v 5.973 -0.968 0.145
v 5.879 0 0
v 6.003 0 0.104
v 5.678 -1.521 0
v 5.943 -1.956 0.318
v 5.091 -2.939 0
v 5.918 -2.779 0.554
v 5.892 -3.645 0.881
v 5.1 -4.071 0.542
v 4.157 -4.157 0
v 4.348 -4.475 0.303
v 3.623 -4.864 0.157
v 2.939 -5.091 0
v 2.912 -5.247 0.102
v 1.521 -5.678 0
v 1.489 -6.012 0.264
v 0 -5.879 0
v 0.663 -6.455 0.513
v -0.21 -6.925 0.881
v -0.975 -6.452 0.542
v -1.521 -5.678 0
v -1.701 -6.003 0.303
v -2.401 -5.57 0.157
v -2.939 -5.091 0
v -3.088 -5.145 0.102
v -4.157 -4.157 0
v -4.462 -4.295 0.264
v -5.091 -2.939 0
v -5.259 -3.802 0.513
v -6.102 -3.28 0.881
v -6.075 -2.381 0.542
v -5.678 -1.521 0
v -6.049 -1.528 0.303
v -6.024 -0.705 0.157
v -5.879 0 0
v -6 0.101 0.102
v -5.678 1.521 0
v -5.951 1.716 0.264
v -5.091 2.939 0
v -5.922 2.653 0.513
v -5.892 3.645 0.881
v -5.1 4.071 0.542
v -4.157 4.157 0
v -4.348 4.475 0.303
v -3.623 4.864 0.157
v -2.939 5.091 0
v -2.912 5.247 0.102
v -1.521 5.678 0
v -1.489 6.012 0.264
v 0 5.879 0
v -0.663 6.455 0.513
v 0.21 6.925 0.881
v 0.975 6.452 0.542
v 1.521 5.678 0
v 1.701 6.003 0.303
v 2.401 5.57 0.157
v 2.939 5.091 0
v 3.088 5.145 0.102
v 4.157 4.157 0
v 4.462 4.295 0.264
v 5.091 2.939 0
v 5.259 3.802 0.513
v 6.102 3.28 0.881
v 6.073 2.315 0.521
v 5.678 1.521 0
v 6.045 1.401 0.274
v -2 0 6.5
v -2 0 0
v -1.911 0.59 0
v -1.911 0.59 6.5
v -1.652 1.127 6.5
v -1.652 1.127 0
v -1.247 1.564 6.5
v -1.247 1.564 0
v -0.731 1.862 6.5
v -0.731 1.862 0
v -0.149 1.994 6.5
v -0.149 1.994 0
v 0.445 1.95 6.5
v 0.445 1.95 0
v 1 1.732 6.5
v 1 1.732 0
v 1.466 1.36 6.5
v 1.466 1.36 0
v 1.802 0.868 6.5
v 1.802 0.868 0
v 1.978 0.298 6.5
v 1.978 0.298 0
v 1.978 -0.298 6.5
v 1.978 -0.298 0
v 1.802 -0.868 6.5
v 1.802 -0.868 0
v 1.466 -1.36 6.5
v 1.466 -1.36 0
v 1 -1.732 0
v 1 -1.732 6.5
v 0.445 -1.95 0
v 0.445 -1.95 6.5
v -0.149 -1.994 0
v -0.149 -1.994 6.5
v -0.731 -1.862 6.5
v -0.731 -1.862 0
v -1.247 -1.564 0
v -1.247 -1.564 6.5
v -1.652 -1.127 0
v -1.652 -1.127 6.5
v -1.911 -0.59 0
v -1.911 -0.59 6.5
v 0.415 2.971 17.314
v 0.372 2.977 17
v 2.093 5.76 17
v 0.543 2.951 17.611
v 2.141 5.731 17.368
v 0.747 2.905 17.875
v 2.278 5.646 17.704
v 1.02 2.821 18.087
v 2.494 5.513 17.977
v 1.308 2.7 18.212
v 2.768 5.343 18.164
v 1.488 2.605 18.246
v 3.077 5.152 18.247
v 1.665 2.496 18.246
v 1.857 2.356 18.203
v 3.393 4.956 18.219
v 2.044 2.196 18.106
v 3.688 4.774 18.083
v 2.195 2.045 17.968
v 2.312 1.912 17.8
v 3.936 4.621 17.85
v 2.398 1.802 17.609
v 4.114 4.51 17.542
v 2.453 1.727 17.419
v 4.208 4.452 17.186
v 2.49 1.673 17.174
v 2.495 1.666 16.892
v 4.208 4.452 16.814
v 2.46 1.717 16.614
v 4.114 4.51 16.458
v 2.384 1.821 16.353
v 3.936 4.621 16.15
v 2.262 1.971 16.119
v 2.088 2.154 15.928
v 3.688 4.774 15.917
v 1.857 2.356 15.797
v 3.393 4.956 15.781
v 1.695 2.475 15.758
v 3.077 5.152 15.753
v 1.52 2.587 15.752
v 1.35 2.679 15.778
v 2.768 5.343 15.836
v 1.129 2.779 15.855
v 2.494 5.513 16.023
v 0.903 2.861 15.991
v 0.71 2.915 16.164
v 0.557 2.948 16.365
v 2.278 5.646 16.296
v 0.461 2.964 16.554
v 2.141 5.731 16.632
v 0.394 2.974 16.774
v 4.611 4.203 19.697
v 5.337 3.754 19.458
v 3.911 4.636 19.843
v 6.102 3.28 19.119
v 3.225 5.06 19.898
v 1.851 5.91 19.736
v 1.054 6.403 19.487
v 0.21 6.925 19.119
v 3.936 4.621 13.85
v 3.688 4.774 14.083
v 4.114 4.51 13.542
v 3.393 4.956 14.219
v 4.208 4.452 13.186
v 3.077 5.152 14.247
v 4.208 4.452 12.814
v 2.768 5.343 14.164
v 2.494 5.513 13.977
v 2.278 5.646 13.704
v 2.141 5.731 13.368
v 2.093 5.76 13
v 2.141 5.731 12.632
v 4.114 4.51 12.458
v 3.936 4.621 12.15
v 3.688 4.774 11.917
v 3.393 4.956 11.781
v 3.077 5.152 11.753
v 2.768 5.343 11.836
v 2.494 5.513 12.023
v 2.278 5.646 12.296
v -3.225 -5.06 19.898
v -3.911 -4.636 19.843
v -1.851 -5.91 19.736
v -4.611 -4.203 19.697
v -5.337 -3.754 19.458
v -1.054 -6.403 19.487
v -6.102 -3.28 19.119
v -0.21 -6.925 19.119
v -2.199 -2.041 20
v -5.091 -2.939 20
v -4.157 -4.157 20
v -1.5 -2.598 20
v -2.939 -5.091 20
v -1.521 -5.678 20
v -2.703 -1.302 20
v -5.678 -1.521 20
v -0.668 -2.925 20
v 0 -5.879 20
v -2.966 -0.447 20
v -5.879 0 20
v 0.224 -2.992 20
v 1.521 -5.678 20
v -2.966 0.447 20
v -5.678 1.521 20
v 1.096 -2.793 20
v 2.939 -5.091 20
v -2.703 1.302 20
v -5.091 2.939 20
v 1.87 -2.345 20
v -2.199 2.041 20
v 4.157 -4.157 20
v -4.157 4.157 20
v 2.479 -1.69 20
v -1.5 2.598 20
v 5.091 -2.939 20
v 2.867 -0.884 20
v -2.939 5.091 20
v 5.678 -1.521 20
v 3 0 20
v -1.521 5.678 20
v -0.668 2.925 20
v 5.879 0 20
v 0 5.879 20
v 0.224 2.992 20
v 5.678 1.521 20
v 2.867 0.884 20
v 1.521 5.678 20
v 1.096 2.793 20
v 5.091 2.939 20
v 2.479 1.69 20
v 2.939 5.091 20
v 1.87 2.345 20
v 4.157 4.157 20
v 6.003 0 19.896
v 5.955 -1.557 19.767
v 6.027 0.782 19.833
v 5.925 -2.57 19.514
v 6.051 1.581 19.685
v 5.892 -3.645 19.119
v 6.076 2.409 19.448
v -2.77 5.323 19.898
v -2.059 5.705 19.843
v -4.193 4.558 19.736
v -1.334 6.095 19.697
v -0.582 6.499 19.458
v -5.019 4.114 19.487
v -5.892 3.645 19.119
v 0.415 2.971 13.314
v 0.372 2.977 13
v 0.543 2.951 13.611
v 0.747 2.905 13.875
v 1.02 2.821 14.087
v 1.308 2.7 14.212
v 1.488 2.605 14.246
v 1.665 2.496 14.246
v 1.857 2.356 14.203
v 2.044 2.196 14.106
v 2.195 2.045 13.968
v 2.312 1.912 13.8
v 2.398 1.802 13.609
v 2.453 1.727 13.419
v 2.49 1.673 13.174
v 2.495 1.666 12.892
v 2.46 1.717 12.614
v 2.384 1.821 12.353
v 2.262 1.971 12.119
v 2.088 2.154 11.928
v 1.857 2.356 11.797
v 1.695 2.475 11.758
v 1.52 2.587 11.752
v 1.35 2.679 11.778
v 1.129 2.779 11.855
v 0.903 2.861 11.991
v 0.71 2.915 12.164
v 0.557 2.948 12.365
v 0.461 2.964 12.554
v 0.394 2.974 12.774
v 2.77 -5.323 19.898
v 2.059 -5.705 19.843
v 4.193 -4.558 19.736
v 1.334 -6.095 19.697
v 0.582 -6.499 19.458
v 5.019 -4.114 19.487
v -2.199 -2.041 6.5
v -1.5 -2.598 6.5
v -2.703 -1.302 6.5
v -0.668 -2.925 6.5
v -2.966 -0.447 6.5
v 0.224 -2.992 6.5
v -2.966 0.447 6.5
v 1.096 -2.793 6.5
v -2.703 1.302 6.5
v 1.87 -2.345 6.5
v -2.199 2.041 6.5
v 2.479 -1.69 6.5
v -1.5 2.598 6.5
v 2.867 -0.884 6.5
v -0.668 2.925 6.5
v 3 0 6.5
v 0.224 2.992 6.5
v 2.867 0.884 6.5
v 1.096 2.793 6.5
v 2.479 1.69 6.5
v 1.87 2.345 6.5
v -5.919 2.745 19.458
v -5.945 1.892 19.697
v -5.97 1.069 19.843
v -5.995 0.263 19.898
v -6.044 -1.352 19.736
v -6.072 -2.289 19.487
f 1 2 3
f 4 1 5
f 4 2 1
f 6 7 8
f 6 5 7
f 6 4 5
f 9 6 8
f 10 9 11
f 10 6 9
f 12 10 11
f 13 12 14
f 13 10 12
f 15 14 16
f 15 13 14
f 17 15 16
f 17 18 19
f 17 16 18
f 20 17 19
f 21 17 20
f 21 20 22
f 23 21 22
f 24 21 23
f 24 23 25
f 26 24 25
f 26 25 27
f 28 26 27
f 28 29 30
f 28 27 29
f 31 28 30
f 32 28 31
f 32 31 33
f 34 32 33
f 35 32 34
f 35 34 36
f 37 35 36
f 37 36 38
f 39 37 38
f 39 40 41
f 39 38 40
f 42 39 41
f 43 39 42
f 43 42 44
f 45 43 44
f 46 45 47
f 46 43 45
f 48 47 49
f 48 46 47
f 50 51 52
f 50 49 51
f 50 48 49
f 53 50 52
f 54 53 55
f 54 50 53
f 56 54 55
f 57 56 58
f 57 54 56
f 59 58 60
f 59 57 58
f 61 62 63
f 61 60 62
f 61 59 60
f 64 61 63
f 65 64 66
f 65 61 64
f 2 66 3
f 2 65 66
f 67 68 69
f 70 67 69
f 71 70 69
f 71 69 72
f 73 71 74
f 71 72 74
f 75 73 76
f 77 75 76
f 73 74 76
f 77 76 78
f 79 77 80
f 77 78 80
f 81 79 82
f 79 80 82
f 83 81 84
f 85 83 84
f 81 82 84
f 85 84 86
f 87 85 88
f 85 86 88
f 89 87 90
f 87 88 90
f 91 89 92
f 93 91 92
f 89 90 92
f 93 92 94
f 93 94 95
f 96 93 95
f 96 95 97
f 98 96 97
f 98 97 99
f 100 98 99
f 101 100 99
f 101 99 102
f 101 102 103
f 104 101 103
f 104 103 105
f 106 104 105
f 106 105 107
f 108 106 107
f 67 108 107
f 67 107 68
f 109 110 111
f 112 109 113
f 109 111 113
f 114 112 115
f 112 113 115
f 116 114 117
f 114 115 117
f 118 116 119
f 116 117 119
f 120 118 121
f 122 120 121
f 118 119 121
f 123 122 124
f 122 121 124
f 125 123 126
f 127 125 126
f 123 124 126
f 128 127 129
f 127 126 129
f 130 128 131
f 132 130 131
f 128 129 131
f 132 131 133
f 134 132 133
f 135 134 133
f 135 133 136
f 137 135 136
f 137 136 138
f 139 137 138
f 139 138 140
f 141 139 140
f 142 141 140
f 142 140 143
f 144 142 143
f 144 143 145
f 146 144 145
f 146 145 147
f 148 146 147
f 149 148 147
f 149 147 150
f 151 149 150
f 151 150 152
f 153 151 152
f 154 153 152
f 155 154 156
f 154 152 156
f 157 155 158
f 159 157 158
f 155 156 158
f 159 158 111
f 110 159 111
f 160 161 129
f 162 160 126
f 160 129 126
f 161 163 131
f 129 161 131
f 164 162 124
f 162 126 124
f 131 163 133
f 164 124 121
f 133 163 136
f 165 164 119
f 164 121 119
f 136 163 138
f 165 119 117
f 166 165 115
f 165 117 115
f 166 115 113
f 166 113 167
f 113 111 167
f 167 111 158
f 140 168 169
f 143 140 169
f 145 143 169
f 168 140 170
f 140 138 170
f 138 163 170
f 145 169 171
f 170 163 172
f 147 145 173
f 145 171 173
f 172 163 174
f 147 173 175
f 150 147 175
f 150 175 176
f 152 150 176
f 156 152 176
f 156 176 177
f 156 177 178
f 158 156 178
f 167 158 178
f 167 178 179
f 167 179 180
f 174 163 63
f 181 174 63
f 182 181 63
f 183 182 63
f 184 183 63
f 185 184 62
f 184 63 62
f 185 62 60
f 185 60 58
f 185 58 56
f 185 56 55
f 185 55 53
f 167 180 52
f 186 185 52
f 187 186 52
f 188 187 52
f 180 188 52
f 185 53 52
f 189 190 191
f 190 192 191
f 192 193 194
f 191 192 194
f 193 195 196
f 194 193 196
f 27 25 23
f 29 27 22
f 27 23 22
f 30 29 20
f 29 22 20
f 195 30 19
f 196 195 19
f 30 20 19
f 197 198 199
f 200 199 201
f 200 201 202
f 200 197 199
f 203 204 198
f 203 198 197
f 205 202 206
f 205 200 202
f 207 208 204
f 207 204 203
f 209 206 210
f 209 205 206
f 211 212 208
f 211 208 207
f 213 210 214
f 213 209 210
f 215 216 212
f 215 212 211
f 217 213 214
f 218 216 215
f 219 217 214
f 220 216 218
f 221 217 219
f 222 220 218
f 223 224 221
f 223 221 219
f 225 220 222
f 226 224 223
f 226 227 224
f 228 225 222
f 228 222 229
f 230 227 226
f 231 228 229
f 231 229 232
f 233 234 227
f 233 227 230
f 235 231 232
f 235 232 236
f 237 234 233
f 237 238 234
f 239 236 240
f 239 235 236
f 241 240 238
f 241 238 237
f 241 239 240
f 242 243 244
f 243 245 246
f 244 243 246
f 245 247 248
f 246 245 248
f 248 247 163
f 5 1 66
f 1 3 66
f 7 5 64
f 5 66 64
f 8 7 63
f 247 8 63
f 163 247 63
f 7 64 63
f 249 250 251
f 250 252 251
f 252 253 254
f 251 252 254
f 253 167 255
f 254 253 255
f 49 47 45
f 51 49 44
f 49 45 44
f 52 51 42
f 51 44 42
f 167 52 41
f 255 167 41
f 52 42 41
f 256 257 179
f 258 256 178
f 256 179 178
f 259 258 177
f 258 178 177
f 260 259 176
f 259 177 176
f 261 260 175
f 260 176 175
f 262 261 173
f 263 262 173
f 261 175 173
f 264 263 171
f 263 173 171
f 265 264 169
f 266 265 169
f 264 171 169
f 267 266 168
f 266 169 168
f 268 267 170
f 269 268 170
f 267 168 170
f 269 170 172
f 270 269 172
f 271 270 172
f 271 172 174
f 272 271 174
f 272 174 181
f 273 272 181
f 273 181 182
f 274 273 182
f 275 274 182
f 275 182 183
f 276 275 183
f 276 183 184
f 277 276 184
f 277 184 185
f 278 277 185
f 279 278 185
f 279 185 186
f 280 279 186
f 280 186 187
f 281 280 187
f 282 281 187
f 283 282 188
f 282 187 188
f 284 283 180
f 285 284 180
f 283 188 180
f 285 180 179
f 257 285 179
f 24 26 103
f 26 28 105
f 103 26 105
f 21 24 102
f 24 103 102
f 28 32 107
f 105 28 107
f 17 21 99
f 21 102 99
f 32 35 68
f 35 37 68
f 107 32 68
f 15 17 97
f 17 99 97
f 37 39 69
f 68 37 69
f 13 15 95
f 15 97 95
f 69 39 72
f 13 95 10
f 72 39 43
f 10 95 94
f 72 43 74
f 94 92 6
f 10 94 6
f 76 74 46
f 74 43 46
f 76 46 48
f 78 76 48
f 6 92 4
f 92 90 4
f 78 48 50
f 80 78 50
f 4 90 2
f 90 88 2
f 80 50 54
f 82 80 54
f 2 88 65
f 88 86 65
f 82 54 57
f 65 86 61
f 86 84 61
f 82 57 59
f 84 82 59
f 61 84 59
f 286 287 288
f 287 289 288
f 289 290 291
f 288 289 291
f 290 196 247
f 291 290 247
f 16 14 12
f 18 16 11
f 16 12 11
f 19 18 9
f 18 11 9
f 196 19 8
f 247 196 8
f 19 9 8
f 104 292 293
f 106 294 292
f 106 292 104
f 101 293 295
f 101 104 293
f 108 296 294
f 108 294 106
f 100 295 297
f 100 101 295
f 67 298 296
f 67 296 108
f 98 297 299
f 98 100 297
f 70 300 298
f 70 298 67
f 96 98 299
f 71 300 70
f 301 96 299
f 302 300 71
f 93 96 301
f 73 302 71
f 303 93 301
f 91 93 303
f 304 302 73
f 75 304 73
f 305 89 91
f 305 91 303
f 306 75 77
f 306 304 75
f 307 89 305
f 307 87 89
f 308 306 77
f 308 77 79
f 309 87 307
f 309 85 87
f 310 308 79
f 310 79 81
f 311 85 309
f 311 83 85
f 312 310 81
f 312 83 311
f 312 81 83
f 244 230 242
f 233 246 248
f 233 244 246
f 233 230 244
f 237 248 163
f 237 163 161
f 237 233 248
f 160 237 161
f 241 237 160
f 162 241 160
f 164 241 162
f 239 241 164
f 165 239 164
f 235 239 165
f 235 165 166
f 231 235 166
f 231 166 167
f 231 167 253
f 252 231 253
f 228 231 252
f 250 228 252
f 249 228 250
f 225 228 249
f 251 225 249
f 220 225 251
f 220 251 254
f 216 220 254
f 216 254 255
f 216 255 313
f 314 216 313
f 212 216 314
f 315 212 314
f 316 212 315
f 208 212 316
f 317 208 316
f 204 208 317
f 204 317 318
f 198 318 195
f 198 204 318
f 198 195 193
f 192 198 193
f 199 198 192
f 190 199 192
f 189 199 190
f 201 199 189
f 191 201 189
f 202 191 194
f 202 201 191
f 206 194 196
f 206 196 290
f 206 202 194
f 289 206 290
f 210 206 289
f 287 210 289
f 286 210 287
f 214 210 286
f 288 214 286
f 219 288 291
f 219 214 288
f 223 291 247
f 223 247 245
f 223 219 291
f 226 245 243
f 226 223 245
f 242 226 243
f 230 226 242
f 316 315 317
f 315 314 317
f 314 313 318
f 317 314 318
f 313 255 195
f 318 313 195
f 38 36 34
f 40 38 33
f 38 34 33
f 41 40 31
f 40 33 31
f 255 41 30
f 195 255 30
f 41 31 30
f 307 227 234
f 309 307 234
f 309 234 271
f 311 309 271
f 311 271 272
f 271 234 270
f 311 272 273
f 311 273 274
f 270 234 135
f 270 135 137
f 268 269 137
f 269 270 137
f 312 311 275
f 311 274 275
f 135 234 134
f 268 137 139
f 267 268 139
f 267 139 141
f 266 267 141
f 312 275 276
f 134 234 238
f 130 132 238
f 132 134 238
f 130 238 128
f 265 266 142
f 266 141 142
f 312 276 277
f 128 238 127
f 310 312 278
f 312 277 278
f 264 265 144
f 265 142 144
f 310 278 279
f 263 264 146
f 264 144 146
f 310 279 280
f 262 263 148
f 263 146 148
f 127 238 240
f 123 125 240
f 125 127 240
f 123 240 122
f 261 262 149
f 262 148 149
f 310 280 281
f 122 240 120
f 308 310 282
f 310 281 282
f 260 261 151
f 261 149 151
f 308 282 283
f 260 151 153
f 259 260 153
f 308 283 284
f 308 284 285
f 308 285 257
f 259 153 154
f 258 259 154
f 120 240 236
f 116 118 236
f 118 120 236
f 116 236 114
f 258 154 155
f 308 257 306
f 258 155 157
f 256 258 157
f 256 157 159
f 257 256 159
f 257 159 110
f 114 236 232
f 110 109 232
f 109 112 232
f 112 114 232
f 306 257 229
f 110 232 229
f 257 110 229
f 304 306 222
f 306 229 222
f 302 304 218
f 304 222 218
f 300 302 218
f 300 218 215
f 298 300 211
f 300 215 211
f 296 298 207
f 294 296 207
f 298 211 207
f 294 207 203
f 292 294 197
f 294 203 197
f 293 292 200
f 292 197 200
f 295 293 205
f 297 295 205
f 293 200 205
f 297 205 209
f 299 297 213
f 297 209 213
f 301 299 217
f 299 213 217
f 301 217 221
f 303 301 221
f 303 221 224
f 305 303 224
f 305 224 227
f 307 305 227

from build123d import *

# Parameters (mm, degrees)
BOSS_EXTRUDE1_DEPTH     = 20
SKETCH2_R               = 2
CUT_EXTRUDE1_DEPTH      = 20
SKETCH3_R               = 3
CUT_EXTRUDE2_DEPTH      = 13.5
SKETCH4_OUTSIDE_W       = 74.532
SKETCH4_OUTSIDE_H       = 76.178
SKETCH4_OUTSIDE_R       = 5.878507538
CUT_EXTRUDE3_DEPTH      = 23.027138831
CUT_EXTRUDE3_DRAFT      = -50
MIRROR1_COPY_1_SKETCH_W = 74.532
MIRROR1_COPY_1_SKETCH_H = 76.178
MIRROR1_COPY_1_SKETCH_R = 5.878507538
MIRROR1_COPY_1_DEPTH    = 23.027138831
MIRROR1_COPY_1_DRAFT    = -50
CUT_EXTRUDE4_REACH      = 27.108
CUT_EXTRUDE4_END_RADIUS = 3
SKETCH5_R               = 1.25


with BuildPart() as part:
    # Sketch1 → Boss-Extrude1 (new body)
    with BuildSketch(Plane.XY):
        Polygon((-6.102382196, -3.280385881), (-0.210293591, -6.925010946), (5.892088606, -3.644625065), (6.102382196, 3.280385881), (0.210293591, 6.925010946), (-5.892088606, 3.644625065), align=None)
    extrude(amount=BOSS_EXTRUDE1_DEPTH)

    # Sketch2 → Cut-Extrude1 (cut)
    with BuildSketch(Plane(origin=(0, 0, 0), x_dir=(-1, 0, 0), z_dir=(0, 0, -1))):
        Circle(SKETCH2_R)
    extrude(amount=-CUT_EXTRUDE1_DEPTH, mode=Mode.SUBTRACT)

    # Sketch3 → Cut-Extrude2 (cut)
    with BuildSketch(Plane.XY.offset(20)):
        Circle(SKETCH3_R)
    extrude(amount=-CUT_EXTRUDE2_DEPTH, mode=Mode.SUBTRACT)


with BuildPart() as cut_extrude3_tool:
    # Sketch4 outside → Cut-Extrude3 (with draft: the straight prism first)
    with BuildSketch(Plane.XY.offset(20)):
        Rectangle(SKETCH4_OUTSIDE_W, SKETCH4_OUTSIDE_H)
        Circle(SKETCH4_OUTSIDE_R, mode=Mode.SUBTRACT)
    extrude(amount=-CUT_EXTRUDE3_DEPTH)
    # Cut-Extrude3: the draft: its side faces are tilted about the plane it starts from
    cut_extrude3_sides = [cut_extrude3_tool.faces().sort_by_distance(p)[0] for p in [
        (0, -38.089, 8.486430585),
        (37.266, 0, 8.486430585),
        (0, 38.089, 8.486430585),
        (-37.266, 0, 8.486430585),
        (-5.878507538, 0, 8.486430585),
    ]]
    draft(cut_extrude3_sides, Plane.XY.offset(20), CUT_EXTRUDE3_DRAFT)


with BuildPart() as part_1:
    add(part.part)

    # Cut-Extrude3: cut by cut_extrude3_tool
    add(cut_extrude3_tool.part, mode=Mode.SUBTRACT)


with BuildPart() as mirror1_copy_1_tool:
    # Mirror1 copy 1 sketch → Mirror1 copy 1 (with draft: the straight prism first)
    with BuildSketch(Plane(origin=(0, 0, 0), x_dir=(1, 0, 0), z_dir=(0, 0, -1))):
        Rectangle(MIRROR1_COPY_1_SKETCH_W, MIRROR1_COPY_1_SKETCH_H)
        Circle(MIRROR1_COPY_1_SKETCH_R, mode=Mode.SUBTRACT)
    extrude(amount=-MIRROR1_COPY_1_DEPTH)
    # Mirror1 copy 1: the draft: its side faces are tilted about the plane it starts from
    mirror1_copy_1_sides = [mirror1_copy_1_tool.faces().sort_by_distance(p)[0] for p in [
        (0, -38.089, 11.513569415),
        (37.266, 0, 11.513569415),
        (0, 38.089, 11.513569415),
        (-37.266, 0, 11.513569415),
        (-5.878507538, 0, 11.513569415),
    ]]
    draft(mirror1_copy_1_sides, Plane(origin=(0, 0, 0), x_dir=(1, 0, 0), z_dir=(0, 0, -1)), MIRROR1_COPY_1_DRAFT)


with BuildPart() as part_2:
    add(part_1.part)

    # Mirror1 copy 1: cut by mirror1_copy_1_tool
    add(mirror1_copy_1_tool.part, mode=Mode.SUBTRACT)

    # Cut-Extrude4: up to this cylinder (the profile starts outside it)
    cut_extrude4_end = Plane(origin=(0, 0, 15), z_dir=(0, 0, 1)) * Cylinder(CUT_EXTRUDE4_END_RADIUS, 65.216, mode=Mode.PRIVATE)
    # Sketch5 → Cut-Extrude4 (cut, up to the surface)
    with BuildSketch(Plane(origin=(3.156337894, 5.102698414, 0), x_dir=(0.8504497356266733, -0.5260563155903765, 0), z_dir=(0.5260563155903764, 0.8504497356266731, 0)), mode=Mode.PRIVATE) as cut_extrude4_sk1:
        with Locations(Location((0, -17, 0), (0, 0, 180))):
            Circle(SKETCH5_R)
    cut_extrude4_tool1 = extrude(cut_extrude4_sk1.sketch, amount=-CUT_EXTRUDE4_REACH, mode=Mode.PRIVATE) - cut_extrude4_end
    add(cut_extrude4_tool1.solids().sort_by_distance((3.156338, 5.102698, 17))[0], mode=Mode.SUBTRACT)
    # Sketch5 → Cut-Extrude4 (cut, up to the surface)
    with BuildSketch(Plane(origin=(3.156337894, 5.102698414, 0), x_dir=(0.8504497356266733, -0.5260563155903765, 0), z_dir=(0.5260563155903764, 0.8504497356266731, 0)), mode=Mode.PRIVATE) as cut_extrude4_sk2:
        with Locations(Location((0, -13, 0), (0, 0, 180))):
            Circle(SKETCH5_R)
    cut_extrude4_tool2 = extrude(cut_extrude4_sk2.sketch, amount=-CUT_EXTRUDE4_REACH, mode=Mode.PRIVATE) - cut_extrude4_end
    add(cut_extrude4_tool2.solids().sort_by_distance((3.156338, 5.102698, 13))[0], mode=Mode.SUBTRACT)


solid = part_2.part
